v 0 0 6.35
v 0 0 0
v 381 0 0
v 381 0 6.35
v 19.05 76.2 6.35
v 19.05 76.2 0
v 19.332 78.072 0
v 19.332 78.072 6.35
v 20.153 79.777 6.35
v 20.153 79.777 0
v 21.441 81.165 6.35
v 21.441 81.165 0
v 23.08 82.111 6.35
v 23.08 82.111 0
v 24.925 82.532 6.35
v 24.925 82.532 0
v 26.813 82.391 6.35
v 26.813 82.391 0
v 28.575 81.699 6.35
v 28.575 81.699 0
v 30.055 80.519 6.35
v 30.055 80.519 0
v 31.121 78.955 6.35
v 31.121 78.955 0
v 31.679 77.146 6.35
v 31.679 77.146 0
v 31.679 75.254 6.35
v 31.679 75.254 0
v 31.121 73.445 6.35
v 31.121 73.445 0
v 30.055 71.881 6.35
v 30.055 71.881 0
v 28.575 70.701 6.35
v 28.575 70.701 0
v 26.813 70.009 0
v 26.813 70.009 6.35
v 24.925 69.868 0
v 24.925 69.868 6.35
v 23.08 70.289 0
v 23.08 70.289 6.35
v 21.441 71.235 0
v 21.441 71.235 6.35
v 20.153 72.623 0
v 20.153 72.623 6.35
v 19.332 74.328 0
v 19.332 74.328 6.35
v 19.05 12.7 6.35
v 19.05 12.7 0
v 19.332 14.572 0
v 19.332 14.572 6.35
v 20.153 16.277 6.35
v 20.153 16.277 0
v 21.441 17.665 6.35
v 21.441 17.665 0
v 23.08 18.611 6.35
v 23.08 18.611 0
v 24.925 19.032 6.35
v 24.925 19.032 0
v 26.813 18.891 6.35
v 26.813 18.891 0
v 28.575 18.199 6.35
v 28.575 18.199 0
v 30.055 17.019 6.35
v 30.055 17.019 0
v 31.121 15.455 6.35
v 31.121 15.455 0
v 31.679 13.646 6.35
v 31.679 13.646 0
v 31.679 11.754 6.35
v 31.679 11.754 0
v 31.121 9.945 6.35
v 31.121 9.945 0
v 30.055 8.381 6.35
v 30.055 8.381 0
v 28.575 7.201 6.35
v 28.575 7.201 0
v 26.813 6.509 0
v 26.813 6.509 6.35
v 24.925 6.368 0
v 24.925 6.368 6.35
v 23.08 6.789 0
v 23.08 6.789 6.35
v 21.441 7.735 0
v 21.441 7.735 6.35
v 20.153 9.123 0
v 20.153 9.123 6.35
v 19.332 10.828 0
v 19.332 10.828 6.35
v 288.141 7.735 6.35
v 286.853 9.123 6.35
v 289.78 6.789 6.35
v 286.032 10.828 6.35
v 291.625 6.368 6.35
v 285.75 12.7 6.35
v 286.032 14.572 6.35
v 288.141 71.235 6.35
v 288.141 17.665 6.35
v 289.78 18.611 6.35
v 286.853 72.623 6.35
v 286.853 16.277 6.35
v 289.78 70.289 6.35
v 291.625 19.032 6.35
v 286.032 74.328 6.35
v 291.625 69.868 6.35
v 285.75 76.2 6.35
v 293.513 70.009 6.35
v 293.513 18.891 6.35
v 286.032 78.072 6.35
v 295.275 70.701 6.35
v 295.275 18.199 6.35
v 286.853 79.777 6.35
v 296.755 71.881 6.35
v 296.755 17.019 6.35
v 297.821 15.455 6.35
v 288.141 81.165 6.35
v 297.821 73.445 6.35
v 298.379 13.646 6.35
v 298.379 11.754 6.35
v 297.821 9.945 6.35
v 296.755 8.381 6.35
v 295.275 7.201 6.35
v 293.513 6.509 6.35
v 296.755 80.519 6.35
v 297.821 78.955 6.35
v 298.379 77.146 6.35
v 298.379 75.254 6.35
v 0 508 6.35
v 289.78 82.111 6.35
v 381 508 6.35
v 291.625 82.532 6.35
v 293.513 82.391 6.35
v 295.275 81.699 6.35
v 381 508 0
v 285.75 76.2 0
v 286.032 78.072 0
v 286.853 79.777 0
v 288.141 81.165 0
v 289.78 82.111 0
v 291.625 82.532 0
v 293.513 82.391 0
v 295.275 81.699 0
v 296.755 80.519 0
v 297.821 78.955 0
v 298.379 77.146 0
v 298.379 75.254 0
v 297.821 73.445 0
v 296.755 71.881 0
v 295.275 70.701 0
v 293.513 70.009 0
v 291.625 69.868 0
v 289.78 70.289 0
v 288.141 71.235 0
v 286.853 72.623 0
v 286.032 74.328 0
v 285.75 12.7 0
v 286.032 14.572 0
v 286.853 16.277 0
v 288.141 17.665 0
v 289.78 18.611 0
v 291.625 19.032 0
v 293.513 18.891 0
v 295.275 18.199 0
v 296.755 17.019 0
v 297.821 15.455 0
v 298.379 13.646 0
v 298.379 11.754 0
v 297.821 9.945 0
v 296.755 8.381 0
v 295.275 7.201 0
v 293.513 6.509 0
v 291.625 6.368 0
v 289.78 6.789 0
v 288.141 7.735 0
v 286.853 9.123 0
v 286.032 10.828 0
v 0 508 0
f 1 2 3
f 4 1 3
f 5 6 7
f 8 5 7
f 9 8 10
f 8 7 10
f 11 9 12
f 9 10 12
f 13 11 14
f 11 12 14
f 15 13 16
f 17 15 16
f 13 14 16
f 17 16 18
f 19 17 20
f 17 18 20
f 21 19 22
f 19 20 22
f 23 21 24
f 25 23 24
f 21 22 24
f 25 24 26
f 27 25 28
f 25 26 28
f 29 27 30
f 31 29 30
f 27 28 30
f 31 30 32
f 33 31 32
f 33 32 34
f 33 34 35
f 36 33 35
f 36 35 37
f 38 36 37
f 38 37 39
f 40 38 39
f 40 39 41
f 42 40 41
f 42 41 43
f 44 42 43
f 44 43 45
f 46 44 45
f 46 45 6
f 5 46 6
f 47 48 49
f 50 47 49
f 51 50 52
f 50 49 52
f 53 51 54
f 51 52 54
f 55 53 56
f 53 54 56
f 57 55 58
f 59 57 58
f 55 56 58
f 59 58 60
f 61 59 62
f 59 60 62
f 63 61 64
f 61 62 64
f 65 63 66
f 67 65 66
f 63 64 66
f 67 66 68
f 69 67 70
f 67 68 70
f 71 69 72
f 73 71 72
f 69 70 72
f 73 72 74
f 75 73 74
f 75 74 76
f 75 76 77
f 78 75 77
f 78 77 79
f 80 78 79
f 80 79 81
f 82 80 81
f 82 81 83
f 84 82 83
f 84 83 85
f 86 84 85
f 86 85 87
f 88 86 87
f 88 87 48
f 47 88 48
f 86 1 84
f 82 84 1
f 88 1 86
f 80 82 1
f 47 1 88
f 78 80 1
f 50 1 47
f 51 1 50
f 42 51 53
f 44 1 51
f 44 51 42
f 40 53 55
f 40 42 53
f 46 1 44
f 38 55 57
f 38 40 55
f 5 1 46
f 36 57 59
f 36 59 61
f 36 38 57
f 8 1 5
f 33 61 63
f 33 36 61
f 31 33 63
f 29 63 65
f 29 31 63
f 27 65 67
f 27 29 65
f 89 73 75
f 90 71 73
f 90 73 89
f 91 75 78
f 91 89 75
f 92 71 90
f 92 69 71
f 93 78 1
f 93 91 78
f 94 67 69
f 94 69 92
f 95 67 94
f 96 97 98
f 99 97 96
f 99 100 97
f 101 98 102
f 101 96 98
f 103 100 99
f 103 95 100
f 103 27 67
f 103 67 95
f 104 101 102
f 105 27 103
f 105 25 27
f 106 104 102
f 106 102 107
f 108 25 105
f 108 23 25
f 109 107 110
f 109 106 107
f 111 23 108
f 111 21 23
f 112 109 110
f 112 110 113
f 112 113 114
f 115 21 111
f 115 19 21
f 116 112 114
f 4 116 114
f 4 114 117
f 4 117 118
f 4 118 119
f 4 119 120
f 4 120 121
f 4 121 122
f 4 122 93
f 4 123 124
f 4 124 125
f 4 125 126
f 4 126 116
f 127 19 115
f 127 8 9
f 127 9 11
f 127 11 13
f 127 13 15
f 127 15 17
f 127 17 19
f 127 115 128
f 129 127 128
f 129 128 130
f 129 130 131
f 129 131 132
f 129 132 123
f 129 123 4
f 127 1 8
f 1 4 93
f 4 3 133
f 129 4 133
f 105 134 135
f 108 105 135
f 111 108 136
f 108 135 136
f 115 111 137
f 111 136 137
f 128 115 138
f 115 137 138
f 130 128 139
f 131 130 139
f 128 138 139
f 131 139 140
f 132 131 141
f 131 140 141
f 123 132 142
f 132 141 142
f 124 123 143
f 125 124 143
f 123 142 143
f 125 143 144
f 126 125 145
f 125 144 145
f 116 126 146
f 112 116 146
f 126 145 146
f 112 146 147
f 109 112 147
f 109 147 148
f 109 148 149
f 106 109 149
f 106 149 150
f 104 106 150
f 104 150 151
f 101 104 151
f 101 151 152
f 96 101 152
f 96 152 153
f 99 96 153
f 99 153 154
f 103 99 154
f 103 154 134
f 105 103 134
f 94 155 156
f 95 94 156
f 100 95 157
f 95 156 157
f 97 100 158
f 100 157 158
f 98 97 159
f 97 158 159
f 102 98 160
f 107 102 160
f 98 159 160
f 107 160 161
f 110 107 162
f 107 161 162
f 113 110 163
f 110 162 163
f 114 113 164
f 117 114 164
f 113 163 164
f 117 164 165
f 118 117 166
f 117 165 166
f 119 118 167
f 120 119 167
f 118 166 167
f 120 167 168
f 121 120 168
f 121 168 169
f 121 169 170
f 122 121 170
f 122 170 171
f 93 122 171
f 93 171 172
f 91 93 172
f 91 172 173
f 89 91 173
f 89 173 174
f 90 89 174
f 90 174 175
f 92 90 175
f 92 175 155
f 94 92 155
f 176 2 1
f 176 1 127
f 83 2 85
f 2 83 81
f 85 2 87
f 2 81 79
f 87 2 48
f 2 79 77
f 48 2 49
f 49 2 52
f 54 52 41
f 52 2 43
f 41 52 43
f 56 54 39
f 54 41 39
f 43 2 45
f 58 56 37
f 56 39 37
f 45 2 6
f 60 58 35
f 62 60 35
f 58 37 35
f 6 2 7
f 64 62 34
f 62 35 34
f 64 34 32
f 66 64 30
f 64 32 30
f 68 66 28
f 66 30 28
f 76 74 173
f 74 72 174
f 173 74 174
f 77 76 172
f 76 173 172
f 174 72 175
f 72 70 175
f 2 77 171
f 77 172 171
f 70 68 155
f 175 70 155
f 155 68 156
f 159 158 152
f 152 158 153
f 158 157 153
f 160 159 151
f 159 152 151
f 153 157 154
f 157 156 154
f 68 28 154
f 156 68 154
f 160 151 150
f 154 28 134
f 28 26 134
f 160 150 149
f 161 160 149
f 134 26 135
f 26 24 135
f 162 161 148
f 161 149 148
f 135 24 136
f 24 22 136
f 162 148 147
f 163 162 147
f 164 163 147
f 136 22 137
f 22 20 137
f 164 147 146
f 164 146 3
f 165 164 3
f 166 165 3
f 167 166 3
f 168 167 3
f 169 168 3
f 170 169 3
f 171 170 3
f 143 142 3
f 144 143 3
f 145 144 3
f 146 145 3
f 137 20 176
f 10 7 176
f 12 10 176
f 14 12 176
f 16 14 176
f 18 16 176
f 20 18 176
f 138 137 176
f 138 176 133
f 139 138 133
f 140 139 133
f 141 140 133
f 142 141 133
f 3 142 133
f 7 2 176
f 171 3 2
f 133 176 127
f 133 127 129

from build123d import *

# Parameters (mm, degrees)
F0_W     = 381
F0_H     = 508
F1_DEPTH = 6.35
F3_D     = 12.7
F3_DEPTH = 25.4


with BuildPart() as f1:
    # F0 (on Top) → F1 (new body)
    with BuildSketch(Plane.XY):
        with Locations((190.5, 254)):
            Rectangle(F0_W, F0_H)
    extrude(amount=F1_DEPTH)

    # F3
    with Locations(Plane.XY.offset(6.35)):
        with Locations((25.4, 12.7), (25.4, 76.2), (292.1, 76.2), (292.1, 12.7)):
            Hole(F3_D / 2, depth=F3_DEPTH)


solid = f1.part
